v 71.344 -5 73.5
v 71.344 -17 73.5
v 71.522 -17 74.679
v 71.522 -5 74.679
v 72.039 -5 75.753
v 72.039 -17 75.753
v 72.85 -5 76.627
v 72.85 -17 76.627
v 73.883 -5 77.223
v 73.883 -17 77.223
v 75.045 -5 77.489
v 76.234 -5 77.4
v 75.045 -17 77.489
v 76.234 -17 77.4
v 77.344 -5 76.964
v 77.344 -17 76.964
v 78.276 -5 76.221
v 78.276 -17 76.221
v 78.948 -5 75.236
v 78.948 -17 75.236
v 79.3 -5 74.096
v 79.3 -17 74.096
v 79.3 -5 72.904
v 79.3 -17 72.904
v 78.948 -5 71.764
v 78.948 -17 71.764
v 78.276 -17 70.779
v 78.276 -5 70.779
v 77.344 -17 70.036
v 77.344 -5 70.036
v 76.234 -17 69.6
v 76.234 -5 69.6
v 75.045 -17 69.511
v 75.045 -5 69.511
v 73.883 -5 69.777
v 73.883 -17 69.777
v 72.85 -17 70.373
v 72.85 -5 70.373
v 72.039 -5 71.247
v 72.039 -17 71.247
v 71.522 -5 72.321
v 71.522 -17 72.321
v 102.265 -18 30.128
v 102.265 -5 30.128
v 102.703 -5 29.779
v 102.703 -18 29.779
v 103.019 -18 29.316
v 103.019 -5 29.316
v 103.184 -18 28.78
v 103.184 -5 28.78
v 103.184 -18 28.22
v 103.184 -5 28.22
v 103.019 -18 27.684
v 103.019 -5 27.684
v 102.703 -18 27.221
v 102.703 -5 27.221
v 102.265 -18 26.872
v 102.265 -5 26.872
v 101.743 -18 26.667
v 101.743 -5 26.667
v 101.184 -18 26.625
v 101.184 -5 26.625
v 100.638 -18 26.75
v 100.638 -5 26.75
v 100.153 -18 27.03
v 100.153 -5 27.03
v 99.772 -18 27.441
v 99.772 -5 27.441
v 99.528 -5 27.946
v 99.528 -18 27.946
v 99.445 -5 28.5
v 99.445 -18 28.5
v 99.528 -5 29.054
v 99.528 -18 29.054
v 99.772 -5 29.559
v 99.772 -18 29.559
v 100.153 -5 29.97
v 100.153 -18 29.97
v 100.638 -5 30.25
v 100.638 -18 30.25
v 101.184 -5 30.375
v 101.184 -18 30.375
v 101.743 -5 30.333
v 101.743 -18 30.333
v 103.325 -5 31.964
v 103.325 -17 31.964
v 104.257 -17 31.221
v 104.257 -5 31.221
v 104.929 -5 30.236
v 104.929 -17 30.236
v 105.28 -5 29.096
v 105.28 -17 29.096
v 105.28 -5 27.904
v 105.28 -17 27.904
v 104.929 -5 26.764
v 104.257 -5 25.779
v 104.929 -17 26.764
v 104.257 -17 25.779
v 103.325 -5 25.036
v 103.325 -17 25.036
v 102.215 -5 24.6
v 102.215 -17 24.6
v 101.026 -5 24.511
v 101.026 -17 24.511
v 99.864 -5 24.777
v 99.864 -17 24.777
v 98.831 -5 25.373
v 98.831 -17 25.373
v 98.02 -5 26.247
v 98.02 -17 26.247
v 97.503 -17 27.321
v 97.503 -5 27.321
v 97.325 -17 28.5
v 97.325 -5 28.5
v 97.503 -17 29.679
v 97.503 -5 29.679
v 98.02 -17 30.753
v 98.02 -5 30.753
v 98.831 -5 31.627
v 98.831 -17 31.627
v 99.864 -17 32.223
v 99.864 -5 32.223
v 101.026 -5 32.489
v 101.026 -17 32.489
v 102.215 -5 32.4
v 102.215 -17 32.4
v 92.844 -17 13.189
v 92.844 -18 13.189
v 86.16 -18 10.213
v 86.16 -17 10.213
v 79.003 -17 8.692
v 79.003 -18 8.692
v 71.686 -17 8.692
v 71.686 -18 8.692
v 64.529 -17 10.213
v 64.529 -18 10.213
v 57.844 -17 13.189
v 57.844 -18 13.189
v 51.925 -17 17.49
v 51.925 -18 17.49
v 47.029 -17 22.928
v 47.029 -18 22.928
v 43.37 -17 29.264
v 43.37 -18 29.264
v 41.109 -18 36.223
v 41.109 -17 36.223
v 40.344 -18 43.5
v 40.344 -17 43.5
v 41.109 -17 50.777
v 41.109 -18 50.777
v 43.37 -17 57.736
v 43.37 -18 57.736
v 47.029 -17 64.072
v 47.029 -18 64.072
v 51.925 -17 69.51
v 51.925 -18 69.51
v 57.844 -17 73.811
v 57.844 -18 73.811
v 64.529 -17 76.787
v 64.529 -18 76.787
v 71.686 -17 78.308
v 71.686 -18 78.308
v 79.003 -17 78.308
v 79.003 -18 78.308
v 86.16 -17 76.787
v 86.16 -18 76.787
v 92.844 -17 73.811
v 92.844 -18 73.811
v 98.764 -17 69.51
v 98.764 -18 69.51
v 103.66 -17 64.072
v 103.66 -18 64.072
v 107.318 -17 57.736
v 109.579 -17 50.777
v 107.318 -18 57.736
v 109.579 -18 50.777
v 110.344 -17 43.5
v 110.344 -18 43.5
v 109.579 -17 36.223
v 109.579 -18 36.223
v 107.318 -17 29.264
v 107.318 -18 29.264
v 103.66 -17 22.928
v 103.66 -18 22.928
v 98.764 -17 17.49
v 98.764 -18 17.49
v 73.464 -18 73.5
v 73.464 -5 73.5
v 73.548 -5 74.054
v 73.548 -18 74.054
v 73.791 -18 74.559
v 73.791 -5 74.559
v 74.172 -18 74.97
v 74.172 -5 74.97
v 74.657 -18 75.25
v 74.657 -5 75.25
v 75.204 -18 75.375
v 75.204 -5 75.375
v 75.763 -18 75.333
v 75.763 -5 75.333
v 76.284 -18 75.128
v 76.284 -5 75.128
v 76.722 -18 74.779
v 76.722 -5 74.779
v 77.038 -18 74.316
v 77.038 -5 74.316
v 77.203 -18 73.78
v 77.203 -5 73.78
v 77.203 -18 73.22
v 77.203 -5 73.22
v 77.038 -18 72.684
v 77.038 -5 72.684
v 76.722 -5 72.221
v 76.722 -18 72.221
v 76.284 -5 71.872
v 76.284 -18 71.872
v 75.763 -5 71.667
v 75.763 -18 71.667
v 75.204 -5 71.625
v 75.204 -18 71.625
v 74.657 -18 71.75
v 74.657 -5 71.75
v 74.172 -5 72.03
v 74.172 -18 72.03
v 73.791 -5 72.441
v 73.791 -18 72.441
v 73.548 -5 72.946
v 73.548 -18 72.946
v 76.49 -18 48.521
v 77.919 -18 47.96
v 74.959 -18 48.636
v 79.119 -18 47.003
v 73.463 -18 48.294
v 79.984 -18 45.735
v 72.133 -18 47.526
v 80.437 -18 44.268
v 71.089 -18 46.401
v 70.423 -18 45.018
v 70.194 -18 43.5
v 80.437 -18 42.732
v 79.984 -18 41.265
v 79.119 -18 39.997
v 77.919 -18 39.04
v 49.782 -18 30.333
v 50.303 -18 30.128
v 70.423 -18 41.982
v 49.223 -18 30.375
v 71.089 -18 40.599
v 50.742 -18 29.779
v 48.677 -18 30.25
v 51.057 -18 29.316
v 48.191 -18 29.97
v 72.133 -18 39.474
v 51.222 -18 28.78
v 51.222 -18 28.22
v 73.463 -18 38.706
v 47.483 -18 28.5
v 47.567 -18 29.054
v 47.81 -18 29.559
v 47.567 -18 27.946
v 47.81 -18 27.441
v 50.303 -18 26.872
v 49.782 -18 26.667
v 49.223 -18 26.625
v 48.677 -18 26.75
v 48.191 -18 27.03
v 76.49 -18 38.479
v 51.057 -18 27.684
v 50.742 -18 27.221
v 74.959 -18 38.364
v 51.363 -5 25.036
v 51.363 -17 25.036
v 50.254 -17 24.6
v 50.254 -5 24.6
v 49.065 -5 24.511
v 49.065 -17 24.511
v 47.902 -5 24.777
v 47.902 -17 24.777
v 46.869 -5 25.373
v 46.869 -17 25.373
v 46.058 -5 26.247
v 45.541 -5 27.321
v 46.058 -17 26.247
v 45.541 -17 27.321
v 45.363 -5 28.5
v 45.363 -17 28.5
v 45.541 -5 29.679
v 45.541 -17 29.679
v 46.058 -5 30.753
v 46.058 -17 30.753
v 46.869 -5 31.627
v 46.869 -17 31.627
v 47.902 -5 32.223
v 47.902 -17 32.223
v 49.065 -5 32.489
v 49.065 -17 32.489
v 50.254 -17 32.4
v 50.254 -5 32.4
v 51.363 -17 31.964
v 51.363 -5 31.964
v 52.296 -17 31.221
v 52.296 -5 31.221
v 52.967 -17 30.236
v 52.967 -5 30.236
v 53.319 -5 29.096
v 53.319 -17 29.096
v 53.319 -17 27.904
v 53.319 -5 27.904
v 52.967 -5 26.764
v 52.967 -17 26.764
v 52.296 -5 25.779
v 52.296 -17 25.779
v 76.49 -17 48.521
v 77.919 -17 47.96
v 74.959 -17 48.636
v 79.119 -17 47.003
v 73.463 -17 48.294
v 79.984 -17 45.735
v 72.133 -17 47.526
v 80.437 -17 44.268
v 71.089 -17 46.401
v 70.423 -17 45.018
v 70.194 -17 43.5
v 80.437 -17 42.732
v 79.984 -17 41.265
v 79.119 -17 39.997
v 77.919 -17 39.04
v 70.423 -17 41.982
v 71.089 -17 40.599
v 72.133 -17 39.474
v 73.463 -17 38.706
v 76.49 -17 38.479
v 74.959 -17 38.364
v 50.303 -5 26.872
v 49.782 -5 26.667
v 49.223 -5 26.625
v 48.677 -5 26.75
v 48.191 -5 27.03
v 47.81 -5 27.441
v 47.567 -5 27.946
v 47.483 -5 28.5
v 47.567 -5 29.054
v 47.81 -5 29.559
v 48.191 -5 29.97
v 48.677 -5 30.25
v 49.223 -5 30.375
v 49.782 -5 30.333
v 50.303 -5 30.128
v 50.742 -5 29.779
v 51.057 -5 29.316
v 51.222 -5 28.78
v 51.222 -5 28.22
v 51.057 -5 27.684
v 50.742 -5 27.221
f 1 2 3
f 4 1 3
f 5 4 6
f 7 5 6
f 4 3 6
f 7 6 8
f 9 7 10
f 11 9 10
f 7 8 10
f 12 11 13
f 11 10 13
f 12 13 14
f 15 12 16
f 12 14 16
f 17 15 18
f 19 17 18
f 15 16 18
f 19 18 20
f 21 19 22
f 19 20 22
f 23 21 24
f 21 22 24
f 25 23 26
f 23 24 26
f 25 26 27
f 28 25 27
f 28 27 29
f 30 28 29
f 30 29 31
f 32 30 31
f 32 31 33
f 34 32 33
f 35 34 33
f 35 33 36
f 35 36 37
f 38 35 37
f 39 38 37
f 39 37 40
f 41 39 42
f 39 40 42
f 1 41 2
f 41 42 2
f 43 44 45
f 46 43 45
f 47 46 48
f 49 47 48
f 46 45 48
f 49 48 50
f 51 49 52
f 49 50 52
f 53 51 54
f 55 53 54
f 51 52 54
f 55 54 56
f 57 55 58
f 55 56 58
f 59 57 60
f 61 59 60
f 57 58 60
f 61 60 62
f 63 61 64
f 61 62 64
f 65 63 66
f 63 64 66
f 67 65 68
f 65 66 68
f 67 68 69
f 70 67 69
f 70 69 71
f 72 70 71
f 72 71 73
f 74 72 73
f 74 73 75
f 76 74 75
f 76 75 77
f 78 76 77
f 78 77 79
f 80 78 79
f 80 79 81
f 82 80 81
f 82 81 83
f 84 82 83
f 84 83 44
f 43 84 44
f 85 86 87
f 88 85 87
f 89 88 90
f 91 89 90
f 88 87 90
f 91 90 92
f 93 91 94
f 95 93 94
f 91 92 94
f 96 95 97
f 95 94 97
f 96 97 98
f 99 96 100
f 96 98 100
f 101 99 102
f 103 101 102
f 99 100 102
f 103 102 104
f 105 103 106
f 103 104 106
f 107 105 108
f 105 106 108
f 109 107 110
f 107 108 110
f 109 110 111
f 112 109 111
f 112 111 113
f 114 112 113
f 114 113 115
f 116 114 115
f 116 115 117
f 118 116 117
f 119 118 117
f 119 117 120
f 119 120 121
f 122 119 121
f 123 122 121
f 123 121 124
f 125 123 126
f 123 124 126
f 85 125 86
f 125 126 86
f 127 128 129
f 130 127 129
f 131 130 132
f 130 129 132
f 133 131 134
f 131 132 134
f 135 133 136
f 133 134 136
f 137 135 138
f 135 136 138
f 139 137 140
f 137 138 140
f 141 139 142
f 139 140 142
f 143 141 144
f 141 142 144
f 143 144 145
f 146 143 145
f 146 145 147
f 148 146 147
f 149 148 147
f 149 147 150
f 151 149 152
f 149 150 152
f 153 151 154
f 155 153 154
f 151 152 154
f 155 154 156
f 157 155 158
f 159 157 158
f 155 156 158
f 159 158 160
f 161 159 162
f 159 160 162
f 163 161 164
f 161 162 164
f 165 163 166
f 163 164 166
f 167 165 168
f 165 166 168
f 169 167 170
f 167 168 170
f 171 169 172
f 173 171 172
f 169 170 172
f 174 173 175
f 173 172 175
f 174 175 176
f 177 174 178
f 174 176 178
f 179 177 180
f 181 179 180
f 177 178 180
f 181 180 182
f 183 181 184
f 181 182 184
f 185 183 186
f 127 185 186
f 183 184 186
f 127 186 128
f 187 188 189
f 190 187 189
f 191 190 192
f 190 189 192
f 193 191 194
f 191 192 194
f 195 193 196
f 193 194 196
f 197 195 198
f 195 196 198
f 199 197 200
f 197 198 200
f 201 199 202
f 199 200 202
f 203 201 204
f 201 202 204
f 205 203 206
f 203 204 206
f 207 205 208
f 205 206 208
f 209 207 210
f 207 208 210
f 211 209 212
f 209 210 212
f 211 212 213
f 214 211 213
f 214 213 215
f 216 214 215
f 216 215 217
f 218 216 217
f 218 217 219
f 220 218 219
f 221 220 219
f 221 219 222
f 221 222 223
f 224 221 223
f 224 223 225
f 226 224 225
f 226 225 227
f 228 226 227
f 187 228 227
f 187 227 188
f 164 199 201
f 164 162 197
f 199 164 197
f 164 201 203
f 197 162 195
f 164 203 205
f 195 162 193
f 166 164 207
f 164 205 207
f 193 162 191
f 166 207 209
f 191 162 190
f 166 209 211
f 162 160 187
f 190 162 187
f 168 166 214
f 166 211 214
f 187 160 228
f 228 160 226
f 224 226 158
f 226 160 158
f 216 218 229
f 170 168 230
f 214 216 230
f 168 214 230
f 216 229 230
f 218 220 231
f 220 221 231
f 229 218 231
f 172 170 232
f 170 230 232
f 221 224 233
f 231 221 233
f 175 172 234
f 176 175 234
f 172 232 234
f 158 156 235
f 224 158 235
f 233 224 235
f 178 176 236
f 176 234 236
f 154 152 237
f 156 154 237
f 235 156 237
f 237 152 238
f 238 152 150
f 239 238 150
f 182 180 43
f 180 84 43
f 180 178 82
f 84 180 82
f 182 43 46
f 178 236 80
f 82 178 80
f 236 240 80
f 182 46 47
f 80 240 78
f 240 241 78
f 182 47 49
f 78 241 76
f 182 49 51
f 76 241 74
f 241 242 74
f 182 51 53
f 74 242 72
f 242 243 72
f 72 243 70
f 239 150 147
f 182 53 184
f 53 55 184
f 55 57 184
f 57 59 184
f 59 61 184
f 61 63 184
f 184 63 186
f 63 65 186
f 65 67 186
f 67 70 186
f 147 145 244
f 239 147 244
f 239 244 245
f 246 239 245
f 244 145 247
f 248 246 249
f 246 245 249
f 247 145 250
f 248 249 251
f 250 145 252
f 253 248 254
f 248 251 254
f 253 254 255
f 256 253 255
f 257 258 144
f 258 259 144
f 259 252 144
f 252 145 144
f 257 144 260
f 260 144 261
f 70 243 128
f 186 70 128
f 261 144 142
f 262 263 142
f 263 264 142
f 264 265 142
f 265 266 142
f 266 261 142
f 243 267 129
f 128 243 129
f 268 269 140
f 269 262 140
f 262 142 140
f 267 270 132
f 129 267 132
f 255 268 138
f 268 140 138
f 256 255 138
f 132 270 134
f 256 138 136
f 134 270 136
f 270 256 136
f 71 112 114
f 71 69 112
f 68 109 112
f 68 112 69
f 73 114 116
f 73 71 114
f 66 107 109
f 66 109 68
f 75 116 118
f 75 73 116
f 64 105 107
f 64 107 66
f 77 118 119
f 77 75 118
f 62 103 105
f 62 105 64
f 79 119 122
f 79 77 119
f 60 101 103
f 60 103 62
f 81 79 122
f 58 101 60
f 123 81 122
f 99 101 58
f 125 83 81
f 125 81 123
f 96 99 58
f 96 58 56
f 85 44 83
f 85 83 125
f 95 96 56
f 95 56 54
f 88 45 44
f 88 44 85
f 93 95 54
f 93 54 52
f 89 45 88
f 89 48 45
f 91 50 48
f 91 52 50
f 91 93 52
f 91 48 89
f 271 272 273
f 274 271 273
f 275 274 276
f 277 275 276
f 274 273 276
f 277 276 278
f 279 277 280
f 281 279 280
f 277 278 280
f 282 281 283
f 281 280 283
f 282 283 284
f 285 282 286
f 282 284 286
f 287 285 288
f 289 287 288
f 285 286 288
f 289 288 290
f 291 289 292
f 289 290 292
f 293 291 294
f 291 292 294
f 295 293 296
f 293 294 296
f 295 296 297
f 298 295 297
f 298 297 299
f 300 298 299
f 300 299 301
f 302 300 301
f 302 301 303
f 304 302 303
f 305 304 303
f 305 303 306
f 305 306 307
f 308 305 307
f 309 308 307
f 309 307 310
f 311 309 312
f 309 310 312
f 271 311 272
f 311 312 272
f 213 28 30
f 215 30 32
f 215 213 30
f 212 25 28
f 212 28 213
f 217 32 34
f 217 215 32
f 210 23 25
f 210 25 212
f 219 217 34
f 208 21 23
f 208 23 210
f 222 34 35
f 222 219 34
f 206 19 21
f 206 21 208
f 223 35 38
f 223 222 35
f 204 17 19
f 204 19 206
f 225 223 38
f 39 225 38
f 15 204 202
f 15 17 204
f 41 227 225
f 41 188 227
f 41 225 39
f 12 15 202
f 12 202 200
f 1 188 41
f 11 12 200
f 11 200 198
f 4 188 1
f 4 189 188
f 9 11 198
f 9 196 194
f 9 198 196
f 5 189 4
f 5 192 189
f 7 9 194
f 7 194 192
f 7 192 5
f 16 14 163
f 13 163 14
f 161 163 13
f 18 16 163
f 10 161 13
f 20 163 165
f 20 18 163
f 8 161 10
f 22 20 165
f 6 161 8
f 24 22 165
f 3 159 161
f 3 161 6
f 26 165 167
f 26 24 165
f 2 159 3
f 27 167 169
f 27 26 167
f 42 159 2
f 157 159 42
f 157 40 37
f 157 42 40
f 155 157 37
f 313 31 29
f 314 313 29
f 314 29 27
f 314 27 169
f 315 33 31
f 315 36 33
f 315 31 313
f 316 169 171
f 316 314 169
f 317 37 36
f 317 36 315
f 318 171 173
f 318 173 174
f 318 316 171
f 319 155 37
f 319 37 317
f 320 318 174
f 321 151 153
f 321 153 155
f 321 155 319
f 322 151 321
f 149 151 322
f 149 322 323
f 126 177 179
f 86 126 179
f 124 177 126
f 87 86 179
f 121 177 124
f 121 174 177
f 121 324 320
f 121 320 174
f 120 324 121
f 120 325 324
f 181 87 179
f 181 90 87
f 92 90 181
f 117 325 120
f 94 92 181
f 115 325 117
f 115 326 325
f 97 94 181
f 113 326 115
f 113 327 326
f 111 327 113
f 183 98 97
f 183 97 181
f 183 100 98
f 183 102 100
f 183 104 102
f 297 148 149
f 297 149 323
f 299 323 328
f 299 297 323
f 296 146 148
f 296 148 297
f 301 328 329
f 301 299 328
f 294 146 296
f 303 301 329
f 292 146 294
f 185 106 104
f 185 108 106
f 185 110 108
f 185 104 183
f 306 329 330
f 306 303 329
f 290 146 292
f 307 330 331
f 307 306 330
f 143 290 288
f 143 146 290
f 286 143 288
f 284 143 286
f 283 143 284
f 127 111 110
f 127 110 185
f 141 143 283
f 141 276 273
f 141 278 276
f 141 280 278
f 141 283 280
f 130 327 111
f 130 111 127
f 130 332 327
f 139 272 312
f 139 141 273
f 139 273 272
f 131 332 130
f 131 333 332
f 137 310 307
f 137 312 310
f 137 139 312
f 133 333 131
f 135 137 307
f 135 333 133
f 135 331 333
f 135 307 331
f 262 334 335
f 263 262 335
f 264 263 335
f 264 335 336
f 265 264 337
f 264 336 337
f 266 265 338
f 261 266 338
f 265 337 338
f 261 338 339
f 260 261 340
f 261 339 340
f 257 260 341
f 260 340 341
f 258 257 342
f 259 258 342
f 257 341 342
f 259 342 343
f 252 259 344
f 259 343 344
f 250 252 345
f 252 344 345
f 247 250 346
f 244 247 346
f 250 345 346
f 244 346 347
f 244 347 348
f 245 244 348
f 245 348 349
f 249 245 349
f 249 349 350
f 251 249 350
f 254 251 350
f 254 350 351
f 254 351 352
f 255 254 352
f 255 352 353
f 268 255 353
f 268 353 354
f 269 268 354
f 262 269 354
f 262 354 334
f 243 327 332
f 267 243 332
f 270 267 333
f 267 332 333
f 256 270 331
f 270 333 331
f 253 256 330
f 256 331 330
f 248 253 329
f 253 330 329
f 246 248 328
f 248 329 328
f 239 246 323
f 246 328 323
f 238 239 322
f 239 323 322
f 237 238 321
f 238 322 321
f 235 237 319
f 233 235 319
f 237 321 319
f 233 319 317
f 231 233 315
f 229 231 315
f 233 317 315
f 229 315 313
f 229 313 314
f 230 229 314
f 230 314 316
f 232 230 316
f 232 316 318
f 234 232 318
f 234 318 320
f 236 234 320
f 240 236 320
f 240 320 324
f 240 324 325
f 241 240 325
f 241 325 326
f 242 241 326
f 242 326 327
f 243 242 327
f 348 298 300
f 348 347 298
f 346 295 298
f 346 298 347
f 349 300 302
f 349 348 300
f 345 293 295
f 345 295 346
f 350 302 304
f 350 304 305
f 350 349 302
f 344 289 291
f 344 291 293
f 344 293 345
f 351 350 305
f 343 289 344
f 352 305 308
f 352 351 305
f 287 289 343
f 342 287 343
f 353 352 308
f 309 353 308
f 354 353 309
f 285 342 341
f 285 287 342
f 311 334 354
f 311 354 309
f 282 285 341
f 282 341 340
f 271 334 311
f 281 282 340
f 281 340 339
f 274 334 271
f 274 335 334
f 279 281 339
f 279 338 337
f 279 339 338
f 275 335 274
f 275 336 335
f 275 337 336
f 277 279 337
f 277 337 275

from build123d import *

# Parameters (mm, degrees)
SKETCH010_R           = 35
PAD001_DEPTH          = 1
SKETCH011_R           = 4
PAD002_DEPTH          = 12
POLARPATTERN003_COUNT = 3
SKETCH012_R           = 1.88
POCKET004_DEPTH       = 212.690759
POLARPATTERN004_COUNT = 3
SKETCH013_R           = 5.15
POCKET005_DEPTH       = 1.001
BODY003_ROLL_ANGLE    = 180
BODY003_PITCH_ANGLE   = 60


with BuildPart() as part:
    # Sketch010 → Pad001 (new body)
    with BuildSketch(Plane.XZ):
        Circle(SKETCH010_R)
    extrude(amount=PAD001_DEPTH)

    # Sketch011 (on Face3 of Pad001) → Pad002 (join)
    with BuildSketch(Plane.XZ.offset(1)):
        with Locations((0, 30)):
            Circle(SKETCH011_R)
    pad002 = extrude(amount=PAD002_DEPTH)

    # PolarPattern003: Pad002 ×3 about axis
    polarpattern003_axis = Axis((0, -1, 0), (0, -1, 0))
    for i in range(1, POLARPATTERN003_COUNT):
        add(pad002.rotate(polarpattern003_axis, i * 360 / POLARPATTERN003_COUNT))

    # Sketch012 (on Face8 of PolarPattern003) → Pocket004 (cut, through all)
    with BuildSketch(Plane.XZ.offset(13)):
        with Locations((0, 30)):
            Circle(SKETCH012_R)
    pocket004 = extrude(amount=-POCKET004_DEPTH, mode=Mode.SUBTRACT)

    # PolarPattern004: Pocket004 ×3 about axis
    polarpattern004_axis = Axis((0, -13, 0), (0, -1, 0))
    for i in range(1, POLARPATTERN004_COUNT):
        add(pocket004.rotate(polarpattern004_axis, i * 360 / POLARPATTERN004_COUNT), mode=Mode.SUBTRACT)

    # Sketch013 (on Face3 of PolarPattern004) → Pocket005 (cut, through all)
    with BuildSketch(Plane.XZ.offset(1)):
        Circle(SKETCH013_R)
    extrude(amount=-POCKET005_DEPTH, mode=Mode.SUBTRACT)


with BuildPart() as part_1:
    # Body003 roll: moved
    add(part.part.rotate(Axis((0, 0, 0), (1, 0, 0)), BODY003_ROLL_ANGLE))


with BuildPart() as part_2:
    # Body003 pitch: moved
    add(part_1.part.rotate(Axis((0, 0, 0), (0, 1, 0)), BODY003_PITCH_ANGLE))


with BuildPart() as part_3:
    # Body003 placement: moved
    add(part_2.part.moved(Location((75.34421, -18, 43.5))))


solid = part_3.part
